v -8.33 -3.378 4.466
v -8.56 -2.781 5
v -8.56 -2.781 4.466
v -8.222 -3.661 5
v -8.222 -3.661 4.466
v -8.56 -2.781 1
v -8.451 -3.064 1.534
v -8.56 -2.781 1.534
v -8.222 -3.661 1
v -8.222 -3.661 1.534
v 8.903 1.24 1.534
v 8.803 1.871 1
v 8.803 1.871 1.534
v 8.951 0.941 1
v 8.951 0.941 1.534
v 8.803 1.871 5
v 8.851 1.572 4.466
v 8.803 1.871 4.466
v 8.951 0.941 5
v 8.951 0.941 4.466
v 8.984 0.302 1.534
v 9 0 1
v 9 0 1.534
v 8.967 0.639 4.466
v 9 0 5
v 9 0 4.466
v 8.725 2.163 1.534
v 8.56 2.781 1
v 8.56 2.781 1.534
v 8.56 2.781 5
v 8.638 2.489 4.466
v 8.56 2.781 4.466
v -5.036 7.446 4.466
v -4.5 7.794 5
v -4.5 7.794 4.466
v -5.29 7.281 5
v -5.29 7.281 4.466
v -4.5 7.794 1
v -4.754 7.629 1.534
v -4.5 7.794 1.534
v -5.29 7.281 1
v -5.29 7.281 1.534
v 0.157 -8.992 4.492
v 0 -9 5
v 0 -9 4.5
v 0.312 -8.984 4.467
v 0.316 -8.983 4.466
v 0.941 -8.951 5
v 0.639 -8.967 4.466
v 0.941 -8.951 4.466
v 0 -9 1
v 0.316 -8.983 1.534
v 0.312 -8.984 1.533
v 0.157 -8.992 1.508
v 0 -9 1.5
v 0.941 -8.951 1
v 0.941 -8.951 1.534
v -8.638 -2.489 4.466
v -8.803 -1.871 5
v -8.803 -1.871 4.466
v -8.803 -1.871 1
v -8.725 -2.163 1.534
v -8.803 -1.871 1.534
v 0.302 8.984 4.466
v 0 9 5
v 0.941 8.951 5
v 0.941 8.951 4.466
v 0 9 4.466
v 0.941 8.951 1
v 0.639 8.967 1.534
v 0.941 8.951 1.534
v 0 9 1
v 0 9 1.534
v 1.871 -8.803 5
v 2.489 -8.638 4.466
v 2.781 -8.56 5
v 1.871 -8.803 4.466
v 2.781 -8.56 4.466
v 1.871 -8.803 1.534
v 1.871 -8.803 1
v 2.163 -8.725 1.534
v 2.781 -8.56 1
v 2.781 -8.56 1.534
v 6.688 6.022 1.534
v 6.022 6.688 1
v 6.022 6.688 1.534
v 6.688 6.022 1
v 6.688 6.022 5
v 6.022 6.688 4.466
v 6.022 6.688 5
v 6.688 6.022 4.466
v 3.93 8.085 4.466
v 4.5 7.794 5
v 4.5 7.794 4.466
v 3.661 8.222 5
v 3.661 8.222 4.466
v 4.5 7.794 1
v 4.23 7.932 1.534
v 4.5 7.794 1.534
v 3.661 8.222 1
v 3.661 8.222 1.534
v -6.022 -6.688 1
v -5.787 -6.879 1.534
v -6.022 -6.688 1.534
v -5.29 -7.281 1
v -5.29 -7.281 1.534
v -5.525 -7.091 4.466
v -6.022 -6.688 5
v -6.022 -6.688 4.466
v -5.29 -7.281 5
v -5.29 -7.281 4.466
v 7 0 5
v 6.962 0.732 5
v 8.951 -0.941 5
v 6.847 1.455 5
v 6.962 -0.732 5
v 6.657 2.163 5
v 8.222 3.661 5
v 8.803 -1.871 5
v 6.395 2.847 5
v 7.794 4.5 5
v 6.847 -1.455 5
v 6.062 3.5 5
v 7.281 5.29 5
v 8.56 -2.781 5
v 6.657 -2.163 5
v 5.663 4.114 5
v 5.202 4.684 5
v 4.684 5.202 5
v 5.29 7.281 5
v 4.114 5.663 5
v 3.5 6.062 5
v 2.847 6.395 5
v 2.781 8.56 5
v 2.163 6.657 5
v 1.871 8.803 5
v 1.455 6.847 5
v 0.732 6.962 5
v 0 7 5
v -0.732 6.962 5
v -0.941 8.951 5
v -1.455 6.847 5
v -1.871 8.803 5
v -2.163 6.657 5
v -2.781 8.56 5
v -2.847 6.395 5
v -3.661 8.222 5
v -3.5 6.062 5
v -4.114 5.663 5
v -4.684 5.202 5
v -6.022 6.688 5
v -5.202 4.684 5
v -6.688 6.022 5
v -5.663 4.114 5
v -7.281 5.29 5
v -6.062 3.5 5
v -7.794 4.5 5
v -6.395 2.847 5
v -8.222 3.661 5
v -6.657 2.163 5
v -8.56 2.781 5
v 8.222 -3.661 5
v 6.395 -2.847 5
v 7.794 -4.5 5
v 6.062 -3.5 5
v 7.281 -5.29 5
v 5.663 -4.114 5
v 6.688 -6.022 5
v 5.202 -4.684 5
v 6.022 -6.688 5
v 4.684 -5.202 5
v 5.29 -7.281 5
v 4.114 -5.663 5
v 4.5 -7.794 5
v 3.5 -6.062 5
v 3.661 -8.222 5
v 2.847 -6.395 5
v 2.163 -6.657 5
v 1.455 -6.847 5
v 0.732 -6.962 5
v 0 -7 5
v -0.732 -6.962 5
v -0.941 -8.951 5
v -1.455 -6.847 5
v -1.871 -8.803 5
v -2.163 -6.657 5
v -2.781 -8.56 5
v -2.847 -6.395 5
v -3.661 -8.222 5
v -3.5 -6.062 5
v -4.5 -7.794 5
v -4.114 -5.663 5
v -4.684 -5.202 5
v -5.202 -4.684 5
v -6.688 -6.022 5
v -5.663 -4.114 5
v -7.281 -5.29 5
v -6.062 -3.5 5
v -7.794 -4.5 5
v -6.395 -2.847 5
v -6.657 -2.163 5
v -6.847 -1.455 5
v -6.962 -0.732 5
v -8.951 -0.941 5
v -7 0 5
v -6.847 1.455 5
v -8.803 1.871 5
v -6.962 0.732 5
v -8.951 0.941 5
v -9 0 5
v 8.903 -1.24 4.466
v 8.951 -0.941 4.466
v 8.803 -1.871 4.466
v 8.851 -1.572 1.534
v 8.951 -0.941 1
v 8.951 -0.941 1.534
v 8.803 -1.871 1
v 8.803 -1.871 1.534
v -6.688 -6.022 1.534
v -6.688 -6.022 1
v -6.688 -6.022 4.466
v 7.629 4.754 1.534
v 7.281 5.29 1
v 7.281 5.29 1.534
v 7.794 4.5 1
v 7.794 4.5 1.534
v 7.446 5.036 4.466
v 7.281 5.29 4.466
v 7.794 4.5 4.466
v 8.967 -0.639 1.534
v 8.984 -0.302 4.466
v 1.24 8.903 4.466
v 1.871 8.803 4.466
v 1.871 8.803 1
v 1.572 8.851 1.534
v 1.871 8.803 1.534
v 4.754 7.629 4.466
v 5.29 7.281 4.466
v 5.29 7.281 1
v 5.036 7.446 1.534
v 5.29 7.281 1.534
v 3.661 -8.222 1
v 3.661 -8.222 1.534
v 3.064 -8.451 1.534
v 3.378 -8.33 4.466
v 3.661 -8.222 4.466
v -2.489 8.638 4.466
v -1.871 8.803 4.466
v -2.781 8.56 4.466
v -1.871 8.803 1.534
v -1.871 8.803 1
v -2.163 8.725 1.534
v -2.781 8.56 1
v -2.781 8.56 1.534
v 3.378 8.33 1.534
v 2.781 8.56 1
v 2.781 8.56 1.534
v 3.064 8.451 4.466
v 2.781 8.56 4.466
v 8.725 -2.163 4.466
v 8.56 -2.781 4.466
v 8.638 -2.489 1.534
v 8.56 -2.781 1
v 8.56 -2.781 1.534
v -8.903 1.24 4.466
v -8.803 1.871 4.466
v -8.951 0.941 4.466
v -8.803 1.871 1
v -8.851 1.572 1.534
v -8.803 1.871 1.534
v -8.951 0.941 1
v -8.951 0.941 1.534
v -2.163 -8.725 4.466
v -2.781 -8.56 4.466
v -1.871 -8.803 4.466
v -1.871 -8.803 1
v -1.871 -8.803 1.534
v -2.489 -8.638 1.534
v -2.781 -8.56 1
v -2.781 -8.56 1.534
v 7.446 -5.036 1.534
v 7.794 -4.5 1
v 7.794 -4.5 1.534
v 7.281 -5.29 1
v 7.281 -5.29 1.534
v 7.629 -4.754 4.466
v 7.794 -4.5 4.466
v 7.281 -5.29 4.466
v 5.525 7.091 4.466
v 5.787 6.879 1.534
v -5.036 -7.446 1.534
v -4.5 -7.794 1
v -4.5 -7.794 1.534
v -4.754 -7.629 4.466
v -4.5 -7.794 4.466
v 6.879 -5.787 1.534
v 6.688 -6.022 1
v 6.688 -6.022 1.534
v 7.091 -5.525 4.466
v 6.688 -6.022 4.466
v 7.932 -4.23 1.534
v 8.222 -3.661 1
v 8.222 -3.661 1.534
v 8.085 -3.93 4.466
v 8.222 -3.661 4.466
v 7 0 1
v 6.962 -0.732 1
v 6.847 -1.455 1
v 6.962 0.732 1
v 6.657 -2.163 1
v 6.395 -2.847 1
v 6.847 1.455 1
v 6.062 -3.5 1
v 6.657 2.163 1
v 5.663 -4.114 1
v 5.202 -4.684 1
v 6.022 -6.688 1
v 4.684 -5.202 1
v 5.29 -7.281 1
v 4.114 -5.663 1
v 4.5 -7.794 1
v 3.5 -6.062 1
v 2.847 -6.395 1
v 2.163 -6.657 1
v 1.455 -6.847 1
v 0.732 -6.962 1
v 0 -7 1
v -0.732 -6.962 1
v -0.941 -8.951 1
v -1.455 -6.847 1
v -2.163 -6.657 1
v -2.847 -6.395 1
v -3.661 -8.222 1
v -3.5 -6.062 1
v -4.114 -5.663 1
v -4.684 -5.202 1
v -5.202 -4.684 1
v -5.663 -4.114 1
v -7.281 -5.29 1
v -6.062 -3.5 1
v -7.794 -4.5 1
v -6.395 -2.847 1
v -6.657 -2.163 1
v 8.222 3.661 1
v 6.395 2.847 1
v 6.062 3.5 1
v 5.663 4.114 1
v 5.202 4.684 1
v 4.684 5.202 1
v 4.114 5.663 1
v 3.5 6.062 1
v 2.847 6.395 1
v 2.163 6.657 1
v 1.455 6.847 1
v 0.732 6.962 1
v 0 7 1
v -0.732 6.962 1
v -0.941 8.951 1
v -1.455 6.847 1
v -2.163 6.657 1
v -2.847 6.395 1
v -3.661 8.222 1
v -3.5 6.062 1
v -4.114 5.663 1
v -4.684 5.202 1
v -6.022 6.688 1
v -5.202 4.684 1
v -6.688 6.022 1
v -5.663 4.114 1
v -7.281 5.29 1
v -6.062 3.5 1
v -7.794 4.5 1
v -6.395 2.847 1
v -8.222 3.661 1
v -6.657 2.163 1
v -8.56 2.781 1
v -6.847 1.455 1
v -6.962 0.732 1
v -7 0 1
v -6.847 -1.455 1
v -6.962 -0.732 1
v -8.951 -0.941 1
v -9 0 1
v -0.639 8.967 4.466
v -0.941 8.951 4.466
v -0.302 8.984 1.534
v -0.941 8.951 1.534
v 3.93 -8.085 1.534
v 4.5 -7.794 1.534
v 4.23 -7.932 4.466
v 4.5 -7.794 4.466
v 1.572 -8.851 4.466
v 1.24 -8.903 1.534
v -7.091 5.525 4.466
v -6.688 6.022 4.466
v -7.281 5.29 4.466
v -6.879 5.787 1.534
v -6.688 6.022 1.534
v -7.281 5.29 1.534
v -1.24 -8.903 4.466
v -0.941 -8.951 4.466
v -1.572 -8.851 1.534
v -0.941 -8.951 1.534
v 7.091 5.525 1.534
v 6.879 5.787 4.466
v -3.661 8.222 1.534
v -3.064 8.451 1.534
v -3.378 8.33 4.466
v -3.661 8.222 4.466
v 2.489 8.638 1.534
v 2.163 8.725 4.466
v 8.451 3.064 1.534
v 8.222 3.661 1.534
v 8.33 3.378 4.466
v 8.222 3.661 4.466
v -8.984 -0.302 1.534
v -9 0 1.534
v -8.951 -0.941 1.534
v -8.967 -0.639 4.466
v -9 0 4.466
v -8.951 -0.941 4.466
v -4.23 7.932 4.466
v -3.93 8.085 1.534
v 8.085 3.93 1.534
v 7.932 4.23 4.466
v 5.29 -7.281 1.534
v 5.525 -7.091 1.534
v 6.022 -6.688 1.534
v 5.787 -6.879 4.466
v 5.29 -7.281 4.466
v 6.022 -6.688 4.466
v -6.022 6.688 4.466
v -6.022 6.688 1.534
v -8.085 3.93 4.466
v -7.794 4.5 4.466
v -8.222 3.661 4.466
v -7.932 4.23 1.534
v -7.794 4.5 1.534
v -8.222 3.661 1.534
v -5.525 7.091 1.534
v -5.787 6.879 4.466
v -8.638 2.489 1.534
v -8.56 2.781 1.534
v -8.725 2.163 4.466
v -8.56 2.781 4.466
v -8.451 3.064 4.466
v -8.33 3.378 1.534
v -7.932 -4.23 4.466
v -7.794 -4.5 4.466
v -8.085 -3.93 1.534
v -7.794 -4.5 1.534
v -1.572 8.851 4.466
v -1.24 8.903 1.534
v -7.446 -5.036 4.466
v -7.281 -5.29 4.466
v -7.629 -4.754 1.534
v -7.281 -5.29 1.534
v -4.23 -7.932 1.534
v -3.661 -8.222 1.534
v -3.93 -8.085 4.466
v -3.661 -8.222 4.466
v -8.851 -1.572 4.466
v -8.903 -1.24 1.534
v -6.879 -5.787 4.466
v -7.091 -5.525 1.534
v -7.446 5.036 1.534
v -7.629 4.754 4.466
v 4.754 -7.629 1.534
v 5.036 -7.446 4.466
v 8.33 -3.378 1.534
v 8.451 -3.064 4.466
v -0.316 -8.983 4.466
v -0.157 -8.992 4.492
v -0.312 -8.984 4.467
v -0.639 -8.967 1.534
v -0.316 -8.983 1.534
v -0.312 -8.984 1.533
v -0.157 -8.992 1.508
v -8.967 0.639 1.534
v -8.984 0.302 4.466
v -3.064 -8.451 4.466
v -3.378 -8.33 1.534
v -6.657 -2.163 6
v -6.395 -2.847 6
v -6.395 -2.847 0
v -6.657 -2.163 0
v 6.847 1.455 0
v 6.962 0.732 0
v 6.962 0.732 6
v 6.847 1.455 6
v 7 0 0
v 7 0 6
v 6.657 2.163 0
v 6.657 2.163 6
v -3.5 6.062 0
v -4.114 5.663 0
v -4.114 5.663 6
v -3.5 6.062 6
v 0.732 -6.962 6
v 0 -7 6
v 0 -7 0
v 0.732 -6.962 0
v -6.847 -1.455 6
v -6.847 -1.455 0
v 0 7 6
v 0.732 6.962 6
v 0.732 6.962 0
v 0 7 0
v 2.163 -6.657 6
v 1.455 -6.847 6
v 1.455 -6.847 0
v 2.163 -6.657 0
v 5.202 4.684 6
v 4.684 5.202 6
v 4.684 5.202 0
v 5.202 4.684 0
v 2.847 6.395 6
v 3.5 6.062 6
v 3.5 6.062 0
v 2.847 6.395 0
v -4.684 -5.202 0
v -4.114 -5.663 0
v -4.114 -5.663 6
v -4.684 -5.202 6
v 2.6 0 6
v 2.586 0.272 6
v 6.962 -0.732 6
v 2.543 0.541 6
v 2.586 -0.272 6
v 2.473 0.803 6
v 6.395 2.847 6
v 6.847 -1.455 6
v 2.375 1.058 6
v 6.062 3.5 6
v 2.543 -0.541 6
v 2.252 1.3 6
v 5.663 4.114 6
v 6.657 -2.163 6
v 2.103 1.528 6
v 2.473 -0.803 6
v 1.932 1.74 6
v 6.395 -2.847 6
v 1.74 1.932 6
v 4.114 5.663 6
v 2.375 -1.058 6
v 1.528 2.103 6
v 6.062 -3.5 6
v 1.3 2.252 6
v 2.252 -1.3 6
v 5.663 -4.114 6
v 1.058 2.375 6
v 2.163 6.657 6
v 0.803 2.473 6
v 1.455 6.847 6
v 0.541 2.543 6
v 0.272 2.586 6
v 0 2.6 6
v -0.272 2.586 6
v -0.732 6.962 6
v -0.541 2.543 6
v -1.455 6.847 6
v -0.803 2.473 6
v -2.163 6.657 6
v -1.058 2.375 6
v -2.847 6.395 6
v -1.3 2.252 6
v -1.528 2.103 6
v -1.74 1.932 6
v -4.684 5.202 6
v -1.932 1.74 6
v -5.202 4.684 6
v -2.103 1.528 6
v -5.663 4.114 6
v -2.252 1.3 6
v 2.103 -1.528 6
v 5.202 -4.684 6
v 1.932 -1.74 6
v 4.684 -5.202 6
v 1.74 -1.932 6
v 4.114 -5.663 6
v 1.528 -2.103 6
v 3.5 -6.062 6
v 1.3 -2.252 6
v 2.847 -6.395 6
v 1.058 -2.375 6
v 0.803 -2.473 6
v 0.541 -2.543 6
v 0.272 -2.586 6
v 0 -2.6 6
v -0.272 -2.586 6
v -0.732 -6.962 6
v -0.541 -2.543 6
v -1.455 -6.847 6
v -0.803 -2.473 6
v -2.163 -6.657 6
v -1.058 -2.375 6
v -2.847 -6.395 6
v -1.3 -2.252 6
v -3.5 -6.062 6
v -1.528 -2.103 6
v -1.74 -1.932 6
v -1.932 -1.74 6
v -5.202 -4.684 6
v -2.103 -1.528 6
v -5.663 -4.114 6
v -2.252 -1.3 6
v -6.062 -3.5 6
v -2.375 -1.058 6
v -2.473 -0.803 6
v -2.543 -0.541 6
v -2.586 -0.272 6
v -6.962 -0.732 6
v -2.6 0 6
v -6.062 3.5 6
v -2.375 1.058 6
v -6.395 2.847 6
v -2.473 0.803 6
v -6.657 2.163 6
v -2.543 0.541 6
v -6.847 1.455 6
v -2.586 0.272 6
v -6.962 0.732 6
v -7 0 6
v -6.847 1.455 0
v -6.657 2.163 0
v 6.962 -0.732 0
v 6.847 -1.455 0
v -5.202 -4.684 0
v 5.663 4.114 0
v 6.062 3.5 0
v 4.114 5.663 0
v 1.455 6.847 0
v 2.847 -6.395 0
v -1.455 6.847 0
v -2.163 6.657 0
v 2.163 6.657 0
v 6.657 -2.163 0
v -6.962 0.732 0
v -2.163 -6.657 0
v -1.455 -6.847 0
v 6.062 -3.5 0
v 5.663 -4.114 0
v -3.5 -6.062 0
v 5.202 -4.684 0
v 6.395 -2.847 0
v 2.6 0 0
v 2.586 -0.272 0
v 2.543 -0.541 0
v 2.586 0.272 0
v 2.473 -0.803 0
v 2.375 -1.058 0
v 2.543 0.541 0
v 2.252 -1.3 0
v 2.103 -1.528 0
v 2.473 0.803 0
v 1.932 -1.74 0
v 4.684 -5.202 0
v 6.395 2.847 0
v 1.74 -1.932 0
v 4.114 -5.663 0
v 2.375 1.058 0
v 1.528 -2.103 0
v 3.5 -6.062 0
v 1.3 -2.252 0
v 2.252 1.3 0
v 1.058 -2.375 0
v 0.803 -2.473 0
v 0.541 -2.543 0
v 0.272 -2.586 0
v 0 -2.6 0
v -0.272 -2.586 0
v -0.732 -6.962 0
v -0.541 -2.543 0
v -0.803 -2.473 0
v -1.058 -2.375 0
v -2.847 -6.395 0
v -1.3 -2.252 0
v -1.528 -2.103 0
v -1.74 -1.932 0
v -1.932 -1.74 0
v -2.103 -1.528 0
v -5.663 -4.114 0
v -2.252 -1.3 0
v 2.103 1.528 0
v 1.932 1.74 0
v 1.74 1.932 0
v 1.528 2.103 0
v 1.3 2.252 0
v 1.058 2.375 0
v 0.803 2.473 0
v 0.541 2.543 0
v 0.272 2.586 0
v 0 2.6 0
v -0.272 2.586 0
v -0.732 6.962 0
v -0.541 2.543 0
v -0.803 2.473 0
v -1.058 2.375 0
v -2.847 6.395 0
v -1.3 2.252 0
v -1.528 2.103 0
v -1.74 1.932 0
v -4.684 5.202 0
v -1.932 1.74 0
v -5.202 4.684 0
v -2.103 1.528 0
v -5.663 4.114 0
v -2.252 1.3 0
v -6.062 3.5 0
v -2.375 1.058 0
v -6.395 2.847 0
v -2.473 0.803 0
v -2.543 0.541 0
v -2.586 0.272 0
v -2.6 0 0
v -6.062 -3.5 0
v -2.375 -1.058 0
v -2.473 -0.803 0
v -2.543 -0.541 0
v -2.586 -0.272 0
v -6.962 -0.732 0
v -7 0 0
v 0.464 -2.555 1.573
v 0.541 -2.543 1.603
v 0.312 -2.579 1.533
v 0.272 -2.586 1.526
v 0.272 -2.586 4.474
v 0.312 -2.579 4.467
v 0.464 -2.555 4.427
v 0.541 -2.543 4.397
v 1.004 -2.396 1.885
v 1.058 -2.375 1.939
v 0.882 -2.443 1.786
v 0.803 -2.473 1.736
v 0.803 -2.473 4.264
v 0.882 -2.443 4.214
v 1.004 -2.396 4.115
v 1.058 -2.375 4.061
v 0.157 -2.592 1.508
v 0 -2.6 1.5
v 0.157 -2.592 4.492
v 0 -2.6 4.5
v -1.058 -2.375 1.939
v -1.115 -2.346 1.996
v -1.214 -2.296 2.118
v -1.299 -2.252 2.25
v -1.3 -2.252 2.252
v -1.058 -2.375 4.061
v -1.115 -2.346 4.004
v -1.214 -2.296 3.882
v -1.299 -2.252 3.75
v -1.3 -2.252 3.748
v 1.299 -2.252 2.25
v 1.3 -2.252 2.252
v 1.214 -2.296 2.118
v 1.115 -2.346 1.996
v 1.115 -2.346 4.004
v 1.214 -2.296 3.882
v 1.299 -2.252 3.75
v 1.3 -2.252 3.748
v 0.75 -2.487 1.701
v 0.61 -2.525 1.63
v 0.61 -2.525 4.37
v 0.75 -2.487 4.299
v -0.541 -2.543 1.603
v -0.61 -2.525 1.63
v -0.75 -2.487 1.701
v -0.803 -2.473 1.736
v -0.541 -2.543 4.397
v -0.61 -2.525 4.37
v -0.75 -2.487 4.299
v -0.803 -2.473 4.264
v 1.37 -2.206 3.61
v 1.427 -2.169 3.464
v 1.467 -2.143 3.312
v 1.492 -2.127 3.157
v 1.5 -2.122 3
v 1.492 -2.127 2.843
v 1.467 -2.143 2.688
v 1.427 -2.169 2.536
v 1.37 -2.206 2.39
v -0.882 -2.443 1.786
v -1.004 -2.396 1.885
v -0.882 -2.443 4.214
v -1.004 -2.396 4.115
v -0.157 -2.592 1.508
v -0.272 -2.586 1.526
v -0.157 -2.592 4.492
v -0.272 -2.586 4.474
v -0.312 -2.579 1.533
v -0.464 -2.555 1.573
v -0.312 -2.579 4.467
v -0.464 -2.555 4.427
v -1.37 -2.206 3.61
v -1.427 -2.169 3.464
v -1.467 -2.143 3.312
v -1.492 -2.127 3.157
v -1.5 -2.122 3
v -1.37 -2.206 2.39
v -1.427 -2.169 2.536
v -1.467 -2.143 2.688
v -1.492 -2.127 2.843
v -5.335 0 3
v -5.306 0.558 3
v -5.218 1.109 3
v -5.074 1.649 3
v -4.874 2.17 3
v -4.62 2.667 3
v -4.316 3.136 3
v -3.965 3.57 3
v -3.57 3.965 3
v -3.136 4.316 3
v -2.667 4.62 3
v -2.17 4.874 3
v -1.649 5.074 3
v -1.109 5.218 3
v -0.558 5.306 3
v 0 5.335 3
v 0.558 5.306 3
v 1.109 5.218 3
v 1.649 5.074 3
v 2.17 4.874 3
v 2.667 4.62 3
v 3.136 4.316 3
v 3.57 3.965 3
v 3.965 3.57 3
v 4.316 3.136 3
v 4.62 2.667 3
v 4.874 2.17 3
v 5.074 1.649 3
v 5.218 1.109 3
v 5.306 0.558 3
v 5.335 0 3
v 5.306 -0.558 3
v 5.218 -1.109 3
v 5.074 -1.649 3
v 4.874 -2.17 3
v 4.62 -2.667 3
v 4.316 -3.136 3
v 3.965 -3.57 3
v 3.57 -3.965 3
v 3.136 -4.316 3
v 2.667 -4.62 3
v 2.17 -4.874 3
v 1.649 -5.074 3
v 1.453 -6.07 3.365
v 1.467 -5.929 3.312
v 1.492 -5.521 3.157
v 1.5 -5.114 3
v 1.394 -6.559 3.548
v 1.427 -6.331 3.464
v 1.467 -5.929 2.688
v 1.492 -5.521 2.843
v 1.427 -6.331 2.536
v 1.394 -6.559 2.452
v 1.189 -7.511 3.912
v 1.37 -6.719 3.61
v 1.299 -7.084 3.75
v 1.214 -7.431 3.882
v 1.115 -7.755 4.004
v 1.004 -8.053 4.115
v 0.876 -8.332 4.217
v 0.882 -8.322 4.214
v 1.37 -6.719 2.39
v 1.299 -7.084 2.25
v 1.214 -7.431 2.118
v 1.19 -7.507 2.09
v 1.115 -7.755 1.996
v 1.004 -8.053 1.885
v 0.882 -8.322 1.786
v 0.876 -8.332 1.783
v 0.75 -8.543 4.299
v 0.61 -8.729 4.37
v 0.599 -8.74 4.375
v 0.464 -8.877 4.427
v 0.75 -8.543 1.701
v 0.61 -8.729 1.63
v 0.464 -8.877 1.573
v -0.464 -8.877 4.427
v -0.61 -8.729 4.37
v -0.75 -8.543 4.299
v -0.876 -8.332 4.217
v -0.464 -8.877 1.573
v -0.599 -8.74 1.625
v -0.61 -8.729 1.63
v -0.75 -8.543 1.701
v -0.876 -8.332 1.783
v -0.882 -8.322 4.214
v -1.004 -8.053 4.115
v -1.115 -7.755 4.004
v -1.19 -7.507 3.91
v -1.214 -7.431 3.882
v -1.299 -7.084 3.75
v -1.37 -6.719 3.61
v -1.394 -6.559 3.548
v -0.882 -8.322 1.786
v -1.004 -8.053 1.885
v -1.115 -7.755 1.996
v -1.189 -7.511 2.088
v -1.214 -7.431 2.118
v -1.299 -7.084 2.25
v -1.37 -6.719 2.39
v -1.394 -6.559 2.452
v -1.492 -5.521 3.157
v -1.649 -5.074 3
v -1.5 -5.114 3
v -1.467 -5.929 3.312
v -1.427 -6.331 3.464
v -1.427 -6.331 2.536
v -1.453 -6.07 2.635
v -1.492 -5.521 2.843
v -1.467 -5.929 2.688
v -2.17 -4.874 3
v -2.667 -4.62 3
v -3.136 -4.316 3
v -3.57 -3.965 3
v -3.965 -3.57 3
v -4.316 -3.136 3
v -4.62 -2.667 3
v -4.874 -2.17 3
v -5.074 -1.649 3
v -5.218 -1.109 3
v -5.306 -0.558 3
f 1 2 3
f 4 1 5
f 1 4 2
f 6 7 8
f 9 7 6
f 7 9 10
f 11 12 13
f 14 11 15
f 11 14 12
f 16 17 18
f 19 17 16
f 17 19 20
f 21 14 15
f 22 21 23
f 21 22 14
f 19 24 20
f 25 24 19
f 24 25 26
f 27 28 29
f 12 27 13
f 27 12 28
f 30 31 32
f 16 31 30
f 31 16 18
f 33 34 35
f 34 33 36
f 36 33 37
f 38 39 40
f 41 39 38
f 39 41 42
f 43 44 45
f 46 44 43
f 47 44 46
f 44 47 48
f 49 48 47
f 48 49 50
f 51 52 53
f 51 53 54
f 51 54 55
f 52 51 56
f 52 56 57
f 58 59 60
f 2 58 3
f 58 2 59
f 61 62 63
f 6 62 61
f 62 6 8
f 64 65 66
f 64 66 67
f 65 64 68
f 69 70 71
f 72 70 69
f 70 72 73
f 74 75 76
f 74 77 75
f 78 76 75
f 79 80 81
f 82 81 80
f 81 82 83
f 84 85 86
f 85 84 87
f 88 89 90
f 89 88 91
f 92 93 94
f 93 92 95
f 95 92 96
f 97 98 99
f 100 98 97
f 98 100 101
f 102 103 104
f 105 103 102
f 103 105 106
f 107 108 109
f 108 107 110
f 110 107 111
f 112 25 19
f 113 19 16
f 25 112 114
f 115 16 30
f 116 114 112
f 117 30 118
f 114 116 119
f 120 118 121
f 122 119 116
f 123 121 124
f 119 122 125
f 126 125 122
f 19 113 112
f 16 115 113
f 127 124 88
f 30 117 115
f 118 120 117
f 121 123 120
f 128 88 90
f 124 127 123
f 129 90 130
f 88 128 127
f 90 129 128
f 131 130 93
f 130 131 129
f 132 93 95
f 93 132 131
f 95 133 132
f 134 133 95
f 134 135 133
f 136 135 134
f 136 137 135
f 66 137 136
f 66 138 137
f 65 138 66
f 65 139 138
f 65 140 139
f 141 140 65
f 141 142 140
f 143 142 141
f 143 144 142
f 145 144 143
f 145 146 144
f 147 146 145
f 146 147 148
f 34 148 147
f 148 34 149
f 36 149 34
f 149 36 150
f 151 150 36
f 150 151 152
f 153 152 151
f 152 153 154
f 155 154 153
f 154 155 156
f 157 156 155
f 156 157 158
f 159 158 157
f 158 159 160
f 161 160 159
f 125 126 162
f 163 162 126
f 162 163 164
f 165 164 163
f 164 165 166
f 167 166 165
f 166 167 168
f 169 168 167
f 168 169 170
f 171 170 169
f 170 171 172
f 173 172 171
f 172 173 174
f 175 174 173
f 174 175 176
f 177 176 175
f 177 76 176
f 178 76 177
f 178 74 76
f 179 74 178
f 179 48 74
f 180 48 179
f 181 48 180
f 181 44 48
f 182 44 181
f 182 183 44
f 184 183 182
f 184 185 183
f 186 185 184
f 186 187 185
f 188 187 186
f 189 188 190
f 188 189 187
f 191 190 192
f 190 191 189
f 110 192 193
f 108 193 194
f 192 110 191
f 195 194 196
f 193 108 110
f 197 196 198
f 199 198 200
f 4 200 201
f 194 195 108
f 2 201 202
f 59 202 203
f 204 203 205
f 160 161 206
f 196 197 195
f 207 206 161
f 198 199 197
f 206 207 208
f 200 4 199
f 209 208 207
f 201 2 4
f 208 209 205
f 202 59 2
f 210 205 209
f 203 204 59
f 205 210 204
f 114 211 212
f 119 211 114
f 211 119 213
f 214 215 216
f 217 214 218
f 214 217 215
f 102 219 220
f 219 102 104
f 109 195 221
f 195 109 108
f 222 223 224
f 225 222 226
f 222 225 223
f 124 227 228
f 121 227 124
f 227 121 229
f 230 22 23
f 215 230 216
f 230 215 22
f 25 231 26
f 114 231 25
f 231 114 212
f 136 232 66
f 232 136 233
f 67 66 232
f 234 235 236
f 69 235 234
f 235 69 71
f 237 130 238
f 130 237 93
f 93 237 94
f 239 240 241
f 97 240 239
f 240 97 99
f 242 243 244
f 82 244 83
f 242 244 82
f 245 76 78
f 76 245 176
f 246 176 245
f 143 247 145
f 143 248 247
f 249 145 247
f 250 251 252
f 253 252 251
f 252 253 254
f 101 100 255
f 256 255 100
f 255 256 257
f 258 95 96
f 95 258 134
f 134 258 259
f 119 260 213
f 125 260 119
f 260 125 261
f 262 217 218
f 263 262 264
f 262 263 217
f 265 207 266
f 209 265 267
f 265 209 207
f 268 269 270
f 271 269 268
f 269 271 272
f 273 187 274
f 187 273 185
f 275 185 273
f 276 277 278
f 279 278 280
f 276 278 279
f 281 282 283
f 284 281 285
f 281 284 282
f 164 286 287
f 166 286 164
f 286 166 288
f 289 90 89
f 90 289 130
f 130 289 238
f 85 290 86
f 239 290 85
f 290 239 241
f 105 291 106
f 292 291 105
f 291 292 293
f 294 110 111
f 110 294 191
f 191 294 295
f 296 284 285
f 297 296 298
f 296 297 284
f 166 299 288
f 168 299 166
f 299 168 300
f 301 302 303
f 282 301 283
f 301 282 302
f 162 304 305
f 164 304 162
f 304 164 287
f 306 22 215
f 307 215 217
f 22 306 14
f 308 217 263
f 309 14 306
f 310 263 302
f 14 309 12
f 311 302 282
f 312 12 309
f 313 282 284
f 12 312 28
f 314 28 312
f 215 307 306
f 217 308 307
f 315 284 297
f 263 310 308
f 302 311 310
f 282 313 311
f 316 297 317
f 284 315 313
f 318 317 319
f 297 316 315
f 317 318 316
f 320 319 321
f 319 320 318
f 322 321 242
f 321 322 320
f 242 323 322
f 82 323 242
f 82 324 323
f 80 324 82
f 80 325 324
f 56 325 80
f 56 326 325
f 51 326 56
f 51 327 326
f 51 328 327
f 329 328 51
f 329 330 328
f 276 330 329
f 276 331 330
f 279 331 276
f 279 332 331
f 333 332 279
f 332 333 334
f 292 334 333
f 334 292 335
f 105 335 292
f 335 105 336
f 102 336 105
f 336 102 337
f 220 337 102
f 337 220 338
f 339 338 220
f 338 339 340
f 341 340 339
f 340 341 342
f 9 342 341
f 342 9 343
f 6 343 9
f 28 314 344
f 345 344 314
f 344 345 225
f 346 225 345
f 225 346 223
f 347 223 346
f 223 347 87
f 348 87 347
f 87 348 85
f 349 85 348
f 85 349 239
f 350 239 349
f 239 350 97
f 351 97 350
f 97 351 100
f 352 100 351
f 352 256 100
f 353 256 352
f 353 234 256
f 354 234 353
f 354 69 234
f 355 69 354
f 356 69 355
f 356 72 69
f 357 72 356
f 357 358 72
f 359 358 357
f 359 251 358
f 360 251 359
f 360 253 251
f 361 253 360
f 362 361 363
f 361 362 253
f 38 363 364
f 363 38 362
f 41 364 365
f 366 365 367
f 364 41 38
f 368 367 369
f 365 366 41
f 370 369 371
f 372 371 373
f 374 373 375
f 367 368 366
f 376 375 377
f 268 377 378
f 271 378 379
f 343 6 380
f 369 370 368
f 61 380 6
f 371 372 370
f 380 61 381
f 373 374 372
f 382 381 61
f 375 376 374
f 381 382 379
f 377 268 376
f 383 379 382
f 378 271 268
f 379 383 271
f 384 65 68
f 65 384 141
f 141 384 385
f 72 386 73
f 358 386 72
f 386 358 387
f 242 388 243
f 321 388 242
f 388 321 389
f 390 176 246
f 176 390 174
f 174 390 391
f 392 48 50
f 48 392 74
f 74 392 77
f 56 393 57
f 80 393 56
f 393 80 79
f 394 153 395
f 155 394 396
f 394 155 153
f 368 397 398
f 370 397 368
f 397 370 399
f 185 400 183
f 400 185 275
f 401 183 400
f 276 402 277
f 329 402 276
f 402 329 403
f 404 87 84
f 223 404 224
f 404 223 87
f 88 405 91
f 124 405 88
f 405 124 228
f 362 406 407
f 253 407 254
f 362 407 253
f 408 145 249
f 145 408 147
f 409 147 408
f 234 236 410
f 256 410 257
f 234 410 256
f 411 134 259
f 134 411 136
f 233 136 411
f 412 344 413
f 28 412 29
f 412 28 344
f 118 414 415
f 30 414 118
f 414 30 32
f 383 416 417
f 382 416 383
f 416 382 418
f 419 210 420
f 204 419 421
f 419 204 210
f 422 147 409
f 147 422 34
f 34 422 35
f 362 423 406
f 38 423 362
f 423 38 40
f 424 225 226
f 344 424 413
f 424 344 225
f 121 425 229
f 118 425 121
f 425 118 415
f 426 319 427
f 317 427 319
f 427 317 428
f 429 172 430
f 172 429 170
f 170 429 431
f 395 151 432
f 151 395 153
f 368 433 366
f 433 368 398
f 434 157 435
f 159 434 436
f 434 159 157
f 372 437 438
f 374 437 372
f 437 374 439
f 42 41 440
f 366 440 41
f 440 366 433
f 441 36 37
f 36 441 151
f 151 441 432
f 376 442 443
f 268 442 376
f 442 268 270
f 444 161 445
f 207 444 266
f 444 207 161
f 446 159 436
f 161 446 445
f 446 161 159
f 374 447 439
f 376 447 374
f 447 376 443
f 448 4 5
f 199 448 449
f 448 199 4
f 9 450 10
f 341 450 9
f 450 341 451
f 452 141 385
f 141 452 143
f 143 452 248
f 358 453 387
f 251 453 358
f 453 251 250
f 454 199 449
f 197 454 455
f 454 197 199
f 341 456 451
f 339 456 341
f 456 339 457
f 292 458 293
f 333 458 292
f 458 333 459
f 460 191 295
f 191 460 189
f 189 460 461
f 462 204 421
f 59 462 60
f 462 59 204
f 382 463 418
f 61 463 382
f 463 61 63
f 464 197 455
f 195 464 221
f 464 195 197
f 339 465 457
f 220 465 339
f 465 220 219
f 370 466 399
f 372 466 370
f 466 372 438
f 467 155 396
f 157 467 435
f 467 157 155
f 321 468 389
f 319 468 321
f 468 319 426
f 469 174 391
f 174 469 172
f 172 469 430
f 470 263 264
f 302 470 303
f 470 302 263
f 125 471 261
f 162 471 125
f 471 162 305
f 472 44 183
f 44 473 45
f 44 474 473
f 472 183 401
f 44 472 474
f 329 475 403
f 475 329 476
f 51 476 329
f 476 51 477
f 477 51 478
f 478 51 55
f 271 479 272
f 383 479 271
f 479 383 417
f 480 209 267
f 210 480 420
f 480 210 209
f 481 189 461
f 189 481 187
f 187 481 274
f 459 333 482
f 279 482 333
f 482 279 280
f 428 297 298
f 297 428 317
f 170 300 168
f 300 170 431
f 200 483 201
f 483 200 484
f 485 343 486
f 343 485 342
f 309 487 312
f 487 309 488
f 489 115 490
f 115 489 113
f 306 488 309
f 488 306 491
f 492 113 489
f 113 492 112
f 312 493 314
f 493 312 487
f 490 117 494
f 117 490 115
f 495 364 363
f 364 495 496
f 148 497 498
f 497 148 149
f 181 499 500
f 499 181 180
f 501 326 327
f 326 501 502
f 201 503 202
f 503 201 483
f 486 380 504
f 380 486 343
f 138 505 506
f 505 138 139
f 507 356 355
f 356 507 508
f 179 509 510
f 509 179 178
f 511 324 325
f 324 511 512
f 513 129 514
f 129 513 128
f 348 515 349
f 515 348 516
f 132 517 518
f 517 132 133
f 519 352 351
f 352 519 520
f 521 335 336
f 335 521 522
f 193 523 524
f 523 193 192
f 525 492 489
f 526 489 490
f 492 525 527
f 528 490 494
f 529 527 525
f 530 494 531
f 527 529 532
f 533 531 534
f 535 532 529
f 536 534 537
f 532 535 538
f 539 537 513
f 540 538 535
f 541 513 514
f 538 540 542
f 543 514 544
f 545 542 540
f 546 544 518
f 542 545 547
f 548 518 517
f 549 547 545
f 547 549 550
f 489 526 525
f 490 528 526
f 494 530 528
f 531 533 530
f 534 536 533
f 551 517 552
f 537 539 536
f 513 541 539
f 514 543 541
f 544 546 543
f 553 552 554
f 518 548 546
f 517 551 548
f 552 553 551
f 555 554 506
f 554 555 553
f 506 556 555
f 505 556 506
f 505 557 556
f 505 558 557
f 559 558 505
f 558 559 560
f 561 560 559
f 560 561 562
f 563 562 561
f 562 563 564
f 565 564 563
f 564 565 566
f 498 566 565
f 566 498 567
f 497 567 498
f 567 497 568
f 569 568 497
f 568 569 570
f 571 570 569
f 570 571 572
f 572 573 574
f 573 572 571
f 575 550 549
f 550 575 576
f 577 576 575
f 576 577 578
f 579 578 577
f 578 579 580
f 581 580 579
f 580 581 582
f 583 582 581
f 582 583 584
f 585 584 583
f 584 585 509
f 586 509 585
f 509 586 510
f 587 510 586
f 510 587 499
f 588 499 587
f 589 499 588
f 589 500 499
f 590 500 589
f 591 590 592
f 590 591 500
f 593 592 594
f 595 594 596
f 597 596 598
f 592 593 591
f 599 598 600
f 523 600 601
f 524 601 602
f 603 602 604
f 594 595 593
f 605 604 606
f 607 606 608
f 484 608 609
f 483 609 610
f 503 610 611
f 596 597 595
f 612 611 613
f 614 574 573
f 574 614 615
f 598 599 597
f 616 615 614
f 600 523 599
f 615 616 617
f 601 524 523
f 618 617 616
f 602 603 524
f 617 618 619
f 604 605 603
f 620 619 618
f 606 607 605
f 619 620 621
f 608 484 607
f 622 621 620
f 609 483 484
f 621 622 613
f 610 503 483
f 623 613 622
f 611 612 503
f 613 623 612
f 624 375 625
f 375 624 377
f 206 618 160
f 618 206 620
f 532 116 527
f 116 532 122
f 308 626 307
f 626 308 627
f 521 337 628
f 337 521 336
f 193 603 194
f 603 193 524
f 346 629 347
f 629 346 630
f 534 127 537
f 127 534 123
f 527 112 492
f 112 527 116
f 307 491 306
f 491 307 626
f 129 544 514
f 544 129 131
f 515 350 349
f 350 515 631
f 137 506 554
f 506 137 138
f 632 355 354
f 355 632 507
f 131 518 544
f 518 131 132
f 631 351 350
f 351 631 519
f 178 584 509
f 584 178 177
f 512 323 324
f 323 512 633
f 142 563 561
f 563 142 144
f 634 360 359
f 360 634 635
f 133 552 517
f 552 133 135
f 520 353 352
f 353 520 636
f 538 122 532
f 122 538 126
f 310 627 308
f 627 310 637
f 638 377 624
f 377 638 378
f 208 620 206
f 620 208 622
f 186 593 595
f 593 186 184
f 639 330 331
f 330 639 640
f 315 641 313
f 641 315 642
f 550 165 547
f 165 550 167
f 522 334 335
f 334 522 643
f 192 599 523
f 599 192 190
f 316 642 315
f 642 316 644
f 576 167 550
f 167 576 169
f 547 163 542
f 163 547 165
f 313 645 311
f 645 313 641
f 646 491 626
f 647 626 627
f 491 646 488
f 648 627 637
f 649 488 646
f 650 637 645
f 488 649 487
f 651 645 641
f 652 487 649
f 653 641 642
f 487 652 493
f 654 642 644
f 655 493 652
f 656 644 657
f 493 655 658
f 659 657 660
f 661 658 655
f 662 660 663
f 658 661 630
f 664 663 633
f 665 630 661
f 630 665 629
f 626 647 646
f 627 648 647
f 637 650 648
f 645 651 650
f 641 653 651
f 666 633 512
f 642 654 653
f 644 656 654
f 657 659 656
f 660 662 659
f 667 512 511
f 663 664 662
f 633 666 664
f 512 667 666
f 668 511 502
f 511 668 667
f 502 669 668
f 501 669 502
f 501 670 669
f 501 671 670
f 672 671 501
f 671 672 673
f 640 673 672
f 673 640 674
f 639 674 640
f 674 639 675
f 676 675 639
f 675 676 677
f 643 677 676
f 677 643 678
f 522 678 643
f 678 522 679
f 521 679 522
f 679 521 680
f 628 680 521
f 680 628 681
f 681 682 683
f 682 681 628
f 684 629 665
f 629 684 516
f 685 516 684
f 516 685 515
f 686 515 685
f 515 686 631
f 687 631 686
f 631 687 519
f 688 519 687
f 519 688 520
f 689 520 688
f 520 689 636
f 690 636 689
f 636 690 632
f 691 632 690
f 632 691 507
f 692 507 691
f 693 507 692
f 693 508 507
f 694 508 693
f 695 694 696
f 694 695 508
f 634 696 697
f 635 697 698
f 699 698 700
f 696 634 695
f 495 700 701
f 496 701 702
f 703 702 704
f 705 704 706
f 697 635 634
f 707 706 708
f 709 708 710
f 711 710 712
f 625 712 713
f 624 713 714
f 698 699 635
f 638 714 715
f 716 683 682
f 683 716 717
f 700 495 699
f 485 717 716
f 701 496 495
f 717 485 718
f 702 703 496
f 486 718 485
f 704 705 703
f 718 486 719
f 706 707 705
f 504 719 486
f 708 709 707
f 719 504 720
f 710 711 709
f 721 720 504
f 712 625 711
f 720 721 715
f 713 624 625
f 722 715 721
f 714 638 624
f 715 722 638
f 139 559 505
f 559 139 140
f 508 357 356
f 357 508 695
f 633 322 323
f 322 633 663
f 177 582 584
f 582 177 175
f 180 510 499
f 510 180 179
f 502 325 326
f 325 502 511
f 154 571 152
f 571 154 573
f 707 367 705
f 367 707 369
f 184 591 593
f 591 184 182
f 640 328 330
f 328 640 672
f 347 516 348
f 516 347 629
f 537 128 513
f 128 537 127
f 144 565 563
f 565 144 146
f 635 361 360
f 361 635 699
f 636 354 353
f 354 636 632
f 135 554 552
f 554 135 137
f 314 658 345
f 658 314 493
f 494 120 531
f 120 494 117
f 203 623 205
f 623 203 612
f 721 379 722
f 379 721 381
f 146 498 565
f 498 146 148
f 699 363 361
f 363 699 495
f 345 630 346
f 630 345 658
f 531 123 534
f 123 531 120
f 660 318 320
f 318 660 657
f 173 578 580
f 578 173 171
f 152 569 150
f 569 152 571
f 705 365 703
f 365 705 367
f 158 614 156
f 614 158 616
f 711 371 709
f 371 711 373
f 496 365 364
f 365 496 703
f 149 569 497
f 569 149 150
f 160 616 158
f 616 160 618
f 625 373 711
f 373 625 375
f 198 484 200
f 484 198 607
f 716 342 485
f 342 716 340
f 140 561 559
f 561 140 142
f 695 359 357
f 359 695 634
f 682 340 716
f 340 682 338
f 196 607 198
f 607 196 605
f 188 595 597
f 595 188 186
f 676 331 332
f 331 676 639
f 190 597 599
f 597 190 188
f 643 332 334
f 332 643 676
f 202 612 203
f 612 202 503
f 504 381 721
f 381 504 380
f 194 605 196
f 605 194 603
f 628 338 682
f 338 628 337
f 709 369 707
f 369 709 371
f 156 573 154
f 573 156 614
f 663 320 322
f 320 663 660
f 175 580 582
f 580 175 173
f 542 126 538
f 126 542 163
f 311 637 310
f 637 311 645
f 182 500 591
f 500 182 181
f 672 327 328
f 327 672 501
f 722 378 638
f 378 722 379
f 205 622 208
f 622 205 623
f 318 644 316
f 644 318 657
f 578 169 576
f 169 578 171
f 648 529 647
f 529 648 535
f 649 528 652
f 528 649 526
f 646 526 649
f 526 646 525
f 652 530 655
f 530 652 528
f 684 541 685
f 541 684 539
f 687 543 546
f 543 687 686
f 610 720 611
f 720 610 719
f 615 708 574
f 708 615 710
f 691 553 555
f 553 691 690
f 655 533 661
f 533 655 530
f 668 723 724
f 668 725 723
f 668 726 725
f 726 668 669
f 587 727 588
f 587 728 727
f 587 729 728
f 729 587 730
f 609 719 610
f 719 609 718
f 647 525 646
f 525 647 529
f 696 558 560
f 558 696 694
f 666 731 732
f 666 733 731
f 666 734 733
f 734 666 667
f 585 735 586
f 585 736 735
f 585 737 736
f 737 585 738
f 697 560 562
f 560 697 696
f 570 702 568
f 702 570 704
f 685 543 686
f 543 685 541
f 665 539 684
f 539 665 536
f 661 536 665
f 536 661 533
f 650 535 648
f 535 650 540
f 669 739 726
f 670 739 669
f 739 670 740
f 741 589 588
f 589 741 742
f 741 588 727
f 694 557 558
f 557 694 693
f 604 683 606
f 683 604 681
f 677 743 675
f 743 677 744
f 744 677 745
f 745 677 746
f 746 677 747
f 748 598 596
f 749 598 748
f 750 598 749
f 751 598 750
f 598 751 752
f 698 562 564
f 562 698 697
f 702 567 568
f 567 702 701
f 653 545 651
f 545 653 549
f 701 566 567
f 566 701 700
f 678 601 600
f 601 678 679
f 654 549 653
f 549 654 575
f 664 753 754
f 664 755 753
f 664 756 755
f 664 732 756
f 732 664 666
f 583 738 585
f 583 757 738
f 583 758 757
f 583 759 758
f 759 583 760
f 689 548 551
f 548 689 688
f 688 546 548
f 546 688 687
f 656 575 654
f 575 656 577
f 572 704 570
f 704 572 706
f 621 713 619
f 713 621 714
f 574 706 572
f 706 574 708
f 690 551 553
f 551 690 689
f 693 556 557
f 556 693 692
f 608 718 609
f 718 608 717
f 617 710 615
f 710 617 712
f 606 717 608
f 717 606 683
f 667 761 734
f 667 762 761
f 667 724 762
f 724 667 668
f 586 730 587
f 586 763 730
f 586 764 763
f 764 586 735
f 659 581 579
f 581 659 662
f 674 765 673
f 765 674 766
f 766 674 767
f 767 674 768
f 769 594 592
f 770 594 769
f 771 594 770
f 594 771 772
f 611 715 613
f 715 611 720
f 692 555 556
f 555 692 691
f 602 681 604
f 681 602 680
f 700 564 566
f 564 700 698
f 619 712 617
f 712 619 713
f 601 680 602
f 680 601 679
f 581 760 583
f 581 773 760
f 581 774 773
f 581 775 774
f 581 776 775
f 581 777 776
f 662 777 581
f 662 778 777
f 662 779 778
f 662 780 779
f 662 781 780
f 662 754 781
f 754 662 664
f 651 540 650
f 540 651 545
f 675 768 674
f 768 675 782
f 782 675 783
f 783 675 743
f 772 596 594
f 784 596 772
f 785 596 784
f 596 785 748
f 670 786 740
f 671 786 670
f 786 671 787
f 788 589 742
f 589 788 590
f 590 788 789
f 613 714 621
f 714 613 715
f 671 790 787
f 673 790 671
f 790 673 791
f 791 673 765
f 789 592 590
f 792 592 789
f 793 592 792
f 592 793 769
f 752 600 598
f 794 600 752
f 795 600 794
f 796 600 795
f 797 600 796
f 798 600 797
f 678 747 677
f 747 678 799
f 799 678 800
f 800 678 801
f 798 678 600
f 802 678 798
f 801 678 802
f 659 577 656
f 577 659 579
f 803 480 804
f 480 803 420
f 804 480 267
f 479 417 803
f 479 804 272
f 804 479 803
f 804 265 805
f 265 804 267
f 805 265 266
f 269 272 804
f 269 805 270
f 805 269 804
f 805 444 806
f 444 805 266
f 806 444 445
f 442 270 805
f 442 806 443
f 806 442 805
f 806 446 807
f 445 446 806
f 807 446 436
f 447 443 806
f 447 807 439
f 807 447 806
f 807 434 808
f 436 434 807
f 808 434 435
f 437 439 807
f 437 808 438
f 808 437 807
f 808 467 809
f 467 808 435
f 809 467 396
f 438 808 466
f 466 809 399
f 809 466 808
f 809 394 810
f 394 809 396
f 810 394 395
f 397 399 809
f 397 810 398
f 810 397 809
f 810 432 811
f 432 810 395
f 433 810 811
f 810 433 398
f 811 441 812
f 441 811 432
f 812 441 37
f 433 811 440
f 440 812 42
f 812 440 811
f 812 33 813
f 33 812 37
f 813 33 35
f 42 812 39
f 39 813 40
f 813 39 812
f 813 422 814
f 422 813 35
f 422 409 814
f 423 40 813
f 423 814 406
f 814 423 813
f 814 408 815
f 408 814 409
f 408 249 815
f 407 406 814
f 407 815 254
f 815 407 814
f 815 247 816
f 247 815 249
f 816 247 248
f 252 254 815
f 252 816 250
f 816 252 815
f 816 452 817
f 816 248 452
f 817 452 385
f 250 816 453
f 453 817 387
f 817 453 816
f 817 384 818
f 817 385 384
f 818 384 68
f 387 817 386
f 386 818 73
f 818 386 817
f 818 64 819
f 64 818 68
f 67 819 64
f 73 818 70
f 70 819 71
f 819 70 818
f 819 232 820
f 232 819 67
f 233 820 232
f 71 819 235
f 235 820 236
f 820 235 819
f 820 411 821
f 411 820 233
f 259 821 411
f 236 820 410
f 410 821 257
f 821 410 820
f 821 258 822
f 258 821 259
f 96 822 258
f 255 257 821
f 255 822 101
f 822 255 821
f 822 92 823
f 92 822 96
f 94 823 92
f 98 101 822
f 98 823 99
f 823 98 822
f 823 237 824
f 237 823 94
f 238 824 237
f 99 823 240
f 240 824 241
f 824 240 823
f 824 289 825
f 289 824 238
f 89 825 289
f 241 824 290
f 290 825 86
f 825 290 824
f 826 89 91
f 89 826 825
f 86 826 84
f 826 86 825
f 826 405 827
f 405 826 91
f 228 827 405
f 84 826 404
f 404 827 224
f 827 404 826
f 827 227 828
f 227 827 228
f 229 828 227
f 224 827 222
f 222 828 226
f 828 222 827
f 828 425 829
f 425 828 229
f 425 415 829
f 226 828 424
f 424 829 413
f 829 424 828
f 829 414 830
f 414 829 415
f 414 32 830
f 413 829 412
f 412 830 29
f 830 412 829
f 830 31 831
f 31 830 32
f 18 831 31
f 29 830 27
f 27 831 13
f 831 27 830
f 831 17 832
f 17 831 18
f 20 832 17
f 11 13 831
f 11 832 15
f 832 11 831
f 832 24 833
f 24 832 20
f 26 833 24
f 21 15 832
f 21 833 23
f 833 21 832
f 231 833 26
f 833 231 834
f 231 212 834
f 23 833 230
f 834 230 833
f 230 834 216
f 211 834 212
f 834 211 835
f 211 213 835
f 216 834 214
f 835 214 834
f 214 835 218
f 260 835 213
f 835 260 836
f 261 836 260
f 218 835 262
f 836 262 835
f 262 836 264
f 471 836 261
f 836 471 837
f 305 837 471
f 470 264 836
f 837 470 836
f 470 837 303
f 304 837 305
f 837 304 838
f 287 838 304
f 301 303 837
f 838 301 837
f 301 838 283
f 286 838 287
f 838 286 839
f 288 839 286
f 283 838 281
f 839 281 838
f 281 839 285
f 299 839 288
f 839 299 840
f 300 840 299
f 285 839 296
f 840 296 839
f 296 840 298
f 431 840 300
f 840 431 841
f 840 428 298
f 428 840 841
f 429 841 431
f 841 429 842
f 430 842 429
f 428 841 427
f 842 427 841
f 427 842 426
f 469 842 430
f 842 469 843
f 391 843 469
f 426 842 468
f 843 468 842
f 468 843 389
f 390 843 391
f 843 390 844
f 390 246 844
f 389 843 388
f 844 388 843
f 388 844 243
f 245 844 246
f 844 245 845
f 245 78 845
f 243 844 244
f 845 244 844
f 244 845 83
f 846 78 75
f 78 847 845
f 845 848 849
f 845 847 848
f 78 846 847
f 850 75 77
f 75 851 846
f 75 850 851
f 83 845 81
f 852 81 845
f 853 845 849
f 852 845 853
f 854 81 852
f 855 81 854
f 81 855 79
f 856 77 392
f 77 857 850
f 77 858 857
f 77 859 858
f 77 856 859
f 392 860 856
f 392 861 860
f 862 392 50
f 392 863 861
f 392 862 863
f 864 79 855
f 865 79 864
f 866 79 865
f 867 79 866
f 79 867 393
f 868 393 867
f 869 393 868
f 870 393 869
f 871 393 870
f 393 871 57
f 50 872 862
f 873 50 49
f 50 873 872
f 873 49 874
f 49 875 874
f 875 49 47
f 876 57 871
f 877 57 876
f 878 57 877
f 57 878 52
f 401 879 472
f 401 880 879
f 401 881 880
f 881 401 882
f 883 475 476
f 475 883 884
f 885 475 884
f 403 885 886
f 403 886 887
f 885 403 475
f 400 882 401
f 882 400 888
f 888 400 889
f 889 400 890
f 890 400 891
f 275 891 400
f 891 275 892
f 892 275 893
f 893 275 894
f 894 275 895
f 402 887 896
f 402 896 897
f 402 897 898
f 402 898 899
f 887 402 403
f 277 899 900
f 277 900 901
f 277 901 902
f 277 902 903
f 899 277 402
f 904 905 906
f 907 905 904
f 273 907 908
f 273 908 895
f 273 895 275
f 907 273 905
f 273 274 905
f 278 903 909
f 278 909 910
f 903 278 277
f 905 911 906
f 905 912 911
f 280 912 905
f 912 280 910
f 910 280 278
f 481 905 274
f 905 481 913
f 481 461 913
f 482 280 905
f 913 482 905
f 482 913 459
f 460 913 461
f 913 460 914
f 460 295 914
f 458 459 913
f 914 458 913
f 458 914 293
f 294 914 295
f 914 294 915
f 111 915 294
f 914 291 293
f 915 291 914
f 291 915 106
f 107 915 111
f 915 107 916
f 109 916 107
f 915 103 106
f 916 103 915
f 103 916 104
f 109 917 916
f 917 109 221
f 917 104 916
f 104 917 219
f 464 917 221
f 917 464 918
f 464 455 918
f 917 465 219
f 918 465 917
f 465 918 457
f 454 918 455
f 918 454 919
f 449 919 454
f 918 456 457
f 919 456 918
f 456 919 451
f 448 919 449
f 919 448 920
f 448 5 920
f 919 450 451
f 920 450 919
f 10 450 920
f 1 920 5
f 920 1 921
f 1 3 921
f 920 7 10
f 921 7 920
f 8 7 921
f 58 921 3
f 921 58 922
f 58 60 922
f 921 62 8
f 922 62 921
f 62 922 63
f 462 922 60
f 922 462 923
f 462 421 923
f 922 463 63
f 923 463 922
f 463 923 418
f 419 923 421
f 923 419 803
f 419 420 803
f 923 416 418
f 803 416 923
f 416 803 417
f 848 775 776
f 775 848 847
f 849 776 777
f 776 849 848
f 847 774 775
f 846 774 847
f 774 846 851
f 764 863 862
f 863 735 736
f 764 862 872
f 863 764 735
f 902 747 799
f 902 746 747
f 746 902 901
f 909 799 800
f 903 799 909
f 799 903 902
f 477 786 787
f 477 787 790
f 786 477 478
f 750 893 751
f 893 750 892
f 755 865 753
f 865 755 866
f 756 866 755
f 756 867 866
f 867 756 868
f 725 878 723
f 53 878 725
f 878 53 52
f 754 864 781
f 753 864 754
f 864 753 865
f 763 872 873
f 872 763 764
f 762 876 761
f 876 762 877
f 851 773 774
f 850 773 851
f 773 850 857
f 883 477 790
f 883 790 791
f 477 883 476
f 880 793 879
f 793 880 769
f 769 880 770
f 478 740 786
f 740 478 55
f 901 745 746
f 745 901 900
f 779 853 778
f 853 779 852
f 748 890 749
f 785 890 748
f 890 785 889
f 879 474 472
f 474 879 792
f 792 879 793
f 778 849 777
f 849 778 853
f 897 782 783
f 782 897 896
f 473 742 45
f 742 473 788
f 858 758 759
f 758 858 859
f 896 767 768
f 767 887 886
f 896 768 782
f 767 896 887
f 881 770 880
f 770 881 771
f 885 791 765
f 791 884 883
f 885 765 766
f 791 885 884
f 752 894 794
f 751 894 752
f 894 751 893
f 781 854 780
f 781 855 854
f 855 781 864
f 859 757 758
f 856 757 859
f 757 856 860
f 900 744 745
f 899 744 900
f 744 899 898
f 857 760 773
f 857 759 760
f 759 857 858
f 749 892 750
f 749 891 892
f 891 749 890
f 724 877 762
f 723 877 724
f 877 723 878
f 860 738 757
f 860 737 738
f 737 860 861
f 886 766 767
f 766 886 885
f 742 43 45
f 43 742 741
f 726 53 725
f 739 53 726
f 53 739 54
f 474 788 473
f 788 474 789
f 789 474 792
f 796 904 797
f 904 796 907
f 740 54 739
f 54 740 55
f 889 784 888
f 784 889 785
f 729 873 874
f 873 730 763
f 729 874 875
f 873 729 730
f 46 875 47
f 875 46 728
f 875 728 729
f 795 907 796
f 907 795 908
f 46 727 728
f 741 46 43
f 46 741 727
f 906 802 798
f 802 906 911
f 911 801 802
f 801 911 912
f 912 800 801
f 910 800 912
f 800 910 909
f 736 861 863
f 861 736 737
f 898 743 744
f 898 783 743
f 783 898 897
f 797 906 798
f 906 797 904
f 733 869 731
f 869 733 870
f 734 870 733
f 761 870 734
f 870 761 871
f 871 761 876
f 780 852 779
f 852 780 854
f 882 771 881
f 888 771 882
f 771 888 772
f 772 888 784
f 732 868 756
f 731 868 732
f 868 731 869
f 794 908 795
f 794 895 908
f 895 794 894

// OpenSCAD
// ====================================================================
// Tower End Sheave Wheel (100% 3D-Printable - Flat on Bed at Z = 0)
// Used at Tower A and Tower B.
// - High flanges to retain cable line securely.
// - 5mm central bore: spins on an M4/M5 bolt in Phase 1;
//   directly accepts a NEMA 17 D-shaft in Phase 2 (includes M3 grub screw hole).
// ====================================================================

$fn = 60;

// Dimensions (mm) - Scaled to 1/3 size (reduced size by 2/3rd)
sheave_outer_dia = 18.0; // Outer flange diameter [scaled from 54mm]
sheave_pitch_dia = 14.67;// Cable track diameter [scaled from 44mm]
sheave_width     = 4.0;  // Total sheave rim width [scaled from 8mm]
hub_h            = 6.0;  // Extended center hub [scaled from 12mm]
bore_dia         = 5.2;  // 5mm motor shaft / M5 screw clearance
grub_screw_dia   = 3.0;  // M3 set/grub screw for Phase 2 motor lock
hub_lift         = (hub_h - sheave_width) / 2; // 1.0mm standoff from bed


module tower_sheave() {
    difference() {
        union() {
            // Main sheave disc (lifted by hub standoff)
            translate([0, 0, hub_lift])
                cylinder(d = sheave_outer_dia, h = sheave_width);
            // Extended center hub (starts at Z = 0)
            cylinder(d = 14.0, h = hub_h);
        }
        
        // Center shaft bore
        translate([0, 0, -1])
            cylinder(d = bore_dia, h = hub_h + 2);
        
        // Deep cable groove
        translate([0, 0, hub_h / 2])
            rotate_extrude(convexity = 10) {
                translate([sheave_pitch_dia / 2, 0, 0])
                    polygon([
                        [-2.0, 0],
                        [6.0, 3.2],
                        [6.0, -3.2]
                    ]);
            }
        
        // Radial M3 grub screw hole (for clamping onto motor shaft in Phase 2)
        translate([0, 0, hub_h / 2])
            rotate([90, 0, 0])
                cylinder(d = grub_screw_dia, h = 20, center = false);
            
        // Decorative weight-reduction spoke cutouts (holiday snowflake / star style)
        for (a = [0 : 60 : 300]) {
            rotate([0, 0, a])
                translate([16, 0, -1])
                    cylinder(d = 8, h = hub_h + 2);
        }
    }
}

// Render flat on bed at Z = 0
tower_sheave();
